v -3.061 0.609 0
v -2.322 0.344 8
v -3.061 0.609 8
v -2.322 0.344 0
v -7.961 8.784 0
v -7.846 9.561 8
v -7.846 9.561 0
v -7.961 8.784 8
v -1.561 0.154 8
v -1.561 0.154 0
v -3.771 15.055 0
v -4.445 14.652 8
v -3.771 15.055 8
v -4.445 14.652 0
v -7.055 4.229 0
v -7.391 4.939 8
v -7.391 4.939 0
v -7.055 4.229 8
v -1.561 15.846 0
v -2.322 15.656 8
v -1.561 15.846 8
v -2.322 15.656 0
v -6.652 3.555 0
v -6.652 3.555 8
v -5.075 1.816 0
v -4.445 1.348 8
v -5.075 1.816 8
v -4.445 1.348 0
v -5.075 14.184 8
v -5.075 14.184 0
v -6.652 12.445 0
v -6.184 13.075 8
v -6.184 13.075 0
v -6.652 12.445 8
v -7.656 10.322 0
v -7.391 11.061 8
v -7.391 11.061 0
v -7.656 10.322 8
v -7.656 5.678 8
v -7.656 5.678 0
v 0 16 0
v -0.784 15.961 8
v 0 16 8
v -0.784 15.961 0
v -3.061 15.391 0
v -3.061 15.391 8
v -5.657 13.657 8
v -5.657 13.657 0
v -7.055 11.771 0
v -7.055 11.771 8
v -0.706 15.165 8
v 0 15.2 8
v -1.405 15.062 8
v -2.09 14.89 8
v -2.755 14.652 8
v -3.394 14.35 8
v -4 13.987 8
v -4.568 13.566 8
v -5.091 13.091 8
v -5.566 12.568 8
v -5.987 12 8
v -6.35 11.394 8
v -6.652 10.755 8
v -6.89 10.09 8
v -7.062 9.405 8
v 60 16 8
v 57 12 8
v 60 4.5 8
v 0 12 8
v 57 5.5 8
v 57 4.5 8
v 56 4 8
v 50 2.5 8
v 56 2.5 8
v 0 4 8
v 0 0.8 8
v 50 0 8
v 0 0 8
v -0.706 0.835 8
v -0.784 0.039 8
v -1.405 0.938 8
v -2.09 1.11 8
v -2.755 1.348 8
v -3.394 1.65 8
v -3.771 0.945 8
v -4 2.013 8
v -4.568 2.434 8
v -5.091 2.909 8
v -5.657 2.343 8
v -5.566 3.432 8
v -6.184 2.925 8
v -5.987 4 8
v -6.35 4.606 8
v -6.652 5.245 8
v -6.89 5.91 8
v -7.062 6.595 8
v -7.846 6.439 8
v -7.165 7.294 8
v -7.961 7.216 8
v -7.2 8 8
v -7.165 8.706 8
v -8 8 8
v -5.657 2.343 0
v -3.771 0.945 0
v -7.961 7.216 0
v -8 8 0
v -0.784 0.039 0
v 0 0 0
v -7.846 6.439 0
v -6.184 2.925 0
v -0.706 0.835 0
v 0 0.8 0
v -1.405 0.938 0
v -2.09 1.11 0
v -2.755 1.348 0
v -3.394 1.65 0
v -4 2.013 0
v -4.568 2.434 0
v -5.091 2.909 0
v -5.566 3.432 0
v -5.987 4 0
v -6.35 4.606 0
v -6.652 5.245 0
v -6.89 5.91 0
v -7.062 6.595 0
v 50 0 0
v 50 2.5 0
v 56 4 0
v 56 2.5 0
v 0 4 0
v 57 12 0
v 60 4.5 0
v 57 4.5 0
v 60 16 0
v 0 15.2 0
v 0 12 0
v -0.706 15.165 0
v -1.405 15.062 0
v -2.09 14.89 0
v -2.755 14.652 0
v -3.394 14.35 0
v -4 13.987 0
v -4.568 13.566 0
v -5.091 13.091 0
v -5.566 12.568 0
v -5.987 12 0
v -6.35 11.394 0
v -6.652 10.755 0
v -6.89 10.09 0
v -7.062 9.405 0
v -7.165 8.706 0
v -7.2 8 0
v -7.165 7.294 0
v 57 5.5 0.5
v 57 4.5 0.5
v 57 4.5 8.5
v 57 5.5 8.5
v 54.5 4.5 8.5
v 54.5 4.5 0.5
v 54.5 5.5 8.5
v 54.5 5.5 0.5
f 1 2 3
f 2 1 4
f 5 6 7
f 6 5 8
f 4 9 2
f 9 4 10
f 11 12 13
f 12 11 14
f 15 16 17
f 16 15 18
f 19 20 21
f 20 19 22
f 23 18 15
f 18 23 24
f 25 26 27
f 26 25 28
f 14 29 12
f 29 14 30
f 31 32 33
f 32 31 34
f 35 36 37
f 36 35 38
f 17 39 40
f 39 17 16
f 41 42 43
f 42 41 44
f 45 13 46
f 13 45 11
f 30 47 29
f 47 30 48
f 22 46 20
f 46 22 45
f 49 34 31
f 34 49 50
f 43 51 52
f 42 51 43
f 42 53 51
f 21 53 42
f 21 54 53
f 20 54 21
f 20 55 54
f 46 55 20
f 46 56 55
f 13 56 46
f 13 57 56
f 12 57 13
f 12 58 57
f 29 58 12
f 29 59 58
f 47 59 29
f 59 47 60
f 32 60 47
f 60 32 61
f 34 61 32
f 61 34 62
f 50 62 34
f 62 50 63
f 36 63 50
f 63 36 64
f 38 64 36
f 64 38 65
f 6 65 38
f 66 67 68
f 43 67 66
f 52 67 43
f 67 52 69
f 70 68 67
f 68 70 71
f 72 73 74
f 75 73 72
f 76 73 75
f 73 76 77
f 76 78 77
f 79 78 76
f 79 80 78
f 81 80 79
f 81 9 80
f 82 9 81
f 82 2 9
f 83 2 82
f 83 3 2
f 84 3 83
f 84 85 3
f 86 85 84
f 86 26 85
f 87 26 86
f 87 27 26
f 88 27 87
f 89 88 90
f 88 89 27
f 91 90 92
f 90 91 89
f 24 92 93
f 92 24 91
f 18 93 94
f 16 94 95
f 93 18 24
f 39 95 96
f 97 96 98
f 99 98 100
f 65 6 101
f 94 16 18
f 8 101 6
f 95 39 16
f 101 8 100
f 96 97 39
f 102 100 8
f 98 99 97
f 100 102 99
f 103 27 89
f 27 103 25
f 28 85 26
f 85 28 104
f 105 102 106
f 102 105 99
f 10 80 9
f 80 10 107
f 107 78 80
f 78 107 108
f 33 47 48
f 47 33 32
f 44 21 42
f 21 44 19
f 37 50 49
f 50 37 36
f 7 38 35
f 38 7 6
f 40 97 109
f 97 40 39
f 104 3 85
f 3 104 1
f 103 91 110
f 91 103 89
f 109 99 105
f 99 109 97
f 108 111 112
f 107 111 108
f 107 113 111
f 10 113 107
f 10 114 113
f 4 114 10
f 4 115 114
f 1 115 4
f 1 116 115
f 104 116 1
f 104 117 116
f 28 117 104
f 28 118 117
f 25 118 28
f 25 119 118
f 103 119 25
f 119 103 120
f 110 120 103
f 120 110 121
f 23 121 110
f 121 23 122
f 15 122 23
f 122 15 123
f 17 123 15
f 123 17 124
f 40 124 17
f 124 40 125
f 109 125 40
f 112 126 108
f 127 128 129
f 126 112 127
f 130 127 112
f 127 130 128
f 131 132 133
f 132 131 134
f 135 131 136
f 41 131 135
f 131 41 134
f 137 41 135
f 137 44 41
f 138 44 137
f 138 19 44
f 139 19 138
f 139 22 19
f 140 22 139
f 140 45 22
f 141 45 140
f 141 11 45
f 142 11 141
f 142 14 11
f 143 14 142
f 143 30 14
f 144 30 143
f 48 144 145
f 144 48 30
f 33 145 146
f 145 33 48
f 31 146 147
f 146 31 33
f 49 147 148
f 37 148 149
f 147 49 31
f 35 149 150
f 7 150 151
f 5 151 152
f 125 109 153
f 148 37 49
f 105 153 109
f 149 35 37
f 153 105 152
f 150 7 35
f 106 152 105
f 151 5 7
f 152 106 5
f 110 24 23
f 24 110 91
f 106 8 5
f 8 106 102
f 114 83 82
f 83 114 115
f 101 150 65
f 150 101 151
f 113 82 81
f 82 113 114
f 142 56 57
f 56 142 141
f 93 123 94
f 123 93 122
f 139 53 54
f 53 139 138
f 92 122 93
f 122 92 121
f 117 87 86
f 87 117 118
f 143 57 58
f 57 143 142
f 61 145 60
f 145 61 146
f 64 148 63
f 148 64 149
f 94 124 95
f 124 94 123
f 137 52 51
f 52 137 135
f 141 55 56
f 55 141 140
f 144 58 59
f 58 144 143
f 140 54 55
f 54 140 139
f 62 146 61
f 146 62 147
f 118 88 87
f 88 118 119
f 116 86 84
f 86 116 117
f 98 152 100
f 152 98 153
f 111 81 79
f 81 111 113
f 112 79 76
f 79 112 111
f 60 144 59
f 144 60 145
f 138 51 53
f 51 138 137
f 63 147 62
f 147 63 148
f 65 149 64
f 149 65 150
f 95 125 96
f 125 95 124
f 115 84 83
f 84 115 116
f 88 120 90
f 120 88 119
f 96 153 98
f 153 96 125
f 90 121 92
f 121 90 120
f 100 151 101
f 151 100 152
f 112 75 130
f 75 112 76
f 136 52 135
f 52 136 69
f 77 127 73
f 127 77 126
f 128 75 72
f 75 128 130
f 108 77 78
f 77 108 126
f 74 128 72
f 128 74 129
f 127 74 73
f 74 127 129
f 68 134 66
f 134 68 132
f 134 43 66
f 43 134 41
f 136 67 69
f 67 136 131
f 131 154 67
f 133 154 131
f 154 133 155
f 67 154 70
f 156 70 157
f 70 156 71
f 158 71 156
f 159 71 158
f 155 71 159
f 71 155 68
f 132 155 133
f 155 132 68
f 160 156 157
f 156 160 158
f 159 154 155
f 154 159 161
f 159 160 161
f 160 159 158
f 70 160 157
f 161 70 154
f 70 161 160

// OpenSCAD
// --- Parameters ---
// Dimensions are in mm. 
// The part is printed flat in the XY plane, extruded 8mm along Z.

// Lower Jaw
lower_bar_x_end = 50;
lower_bar_y_start = 0;
lower_bar_y_end = 4;

// Lower Jaw Tongue
tongue_x_start = 50;
tongue_x_end = 56;
tongue_y_start = 2.5;
tongue_y_end = 4;

// Upper Jaw
upper_bar_x_end = 60;
upper_bar_y_start = 12;
upper_bar_y_end = 16;

// Hinge (Half-ring on the left)
hinge_center_x = 0;
hinge_center_y = 8;
hinge_outer_radius = 8;
hinge_inner_radius = 7.2;

// Pinch Ridges (Half-round profiles)
ridge_radius = 1.5;
ridge_x_pos = 27.5;
ridge_lower_y = 4;
ridge_upper_y = 12;

// Latch Assembly
latch_leg_x_start = 57;
latch_leg_x_end = 60;
latch_leg_y_start = 4.5;
latch_leg_y_end = 12;

latch_nose_x_start = 54.5;
latch_nose_x_end = 57;
latch_nose_y_start = 4.5;
latch_nose_y_end = 5.5;
latch_nose_z_offset = 0.5; // Height above the tongue

// Extrusion Depth
thickness = 8;

// Resolution
$fn = 64;

// --- Main Construction ---

union() {
    // 1. Lower Jaw Bar
    cube([lower_bar_x_end, lower_bar_y_end - lower_bar_y_start, thickness]);
    translate([0, lower_bar_y_start, 0])
        cube([lower_bar_x_end, lower_bar_y_end - lower_bar_y_start, thickness]);
    
    // 2. Lower Jaw Tongue
    translate([tongue_x_start, tongue_y_start, 0])
        cube([tongue_x_end - tongue_x_start, tongue_y_end - tongue_y_start, thickness]);

    // 3. Upper Jaw Bar
    translate([0, upper_bar_y_start, 0])
        cube([upper_bar_x_end, upper_bar_y_end - upper_bar_y_start, thickness]);

    // 4. Hinge (Half-ring)
    // We create a full ring and subtract the right half to ensure a clean edge at x=0
    difference() {
        translate([hinge_center_x, hinge_center_y, 0])
            cylinder(h = thickness, r = hinge_outer_radius);
        
        translate([hinge_center_x, hinge_center_y, -1])
            cylinder(h = thickness + 2, r = hinge_inner_radius);
        
        // Cut the right half of the ring to keep only the left side (x < 0)
        translate([hinge_center_x, hinge_center_y - hinge_outer_radius, -1])
            cube([hinge_outer_radius * 2, hinge_outer_radius * 2, thickness + 2]);
    }

    // 5. Latch Leg
    translate([latch_leg_x_start, latch_leg_y_start, 0])
        cube([latch_leg_x_end - latch_leg_x_start, latch_leg_y_end - latch_leg_y_start, thickness]);

    // 6. Latch Nose
    translate([latch_nose_x_start, latch_nose_y_start, latch_nose_z_offset])
        cube([latch_nose_x_end - latch_nose_x_start, latch_nose_y_end - latch_nose_y_start, thickness]);
}

// --- Subtraction of Pinch Ridges ---
// We use a difference to "carve" the half-round grooves into the inner faces
difference() {
    // This block is just a wrapper to apply the difference to the whole assembly
    // However, in OpenSCAD, it's cleaner to wrap the whole union in a difference
    // but since I've already used union, I will re-structure the logic mentally:
    // The user wants ridges on the "inner face". 
    // This means the ridge is a protrusion, but usually, in clamps, 
    // a "pinch ridge" is a protrusion. If it's a "half-round ridge", 
    // it adds material. If it's a "groove", it removes it.
    // Given "pinch ridge", I will treat it as a protrusion (adding material).
    // If the user meant a groove, they would say "groove".
}

// Correcting logic: The user says "Each jaw has a half-round pinch ridge... on its inner face".
// This implies the ridge is an addition to the geometry.
// I will add the ridges using a union.

// Re-calculating: The previous union included the bars. I will add the ridges to that union.
// Since I cannot rewrite the whole block easily without breaking the structure, 
// I will use a separate union for the ridges.

// (Self-correction: I will combine everything into one single union block)

// --- Final Assembly Logic ---

// Since I cannot "add" to a union after it's defined, I will rewrite the structure.

// [REWRITTEN CODE BELOW]
